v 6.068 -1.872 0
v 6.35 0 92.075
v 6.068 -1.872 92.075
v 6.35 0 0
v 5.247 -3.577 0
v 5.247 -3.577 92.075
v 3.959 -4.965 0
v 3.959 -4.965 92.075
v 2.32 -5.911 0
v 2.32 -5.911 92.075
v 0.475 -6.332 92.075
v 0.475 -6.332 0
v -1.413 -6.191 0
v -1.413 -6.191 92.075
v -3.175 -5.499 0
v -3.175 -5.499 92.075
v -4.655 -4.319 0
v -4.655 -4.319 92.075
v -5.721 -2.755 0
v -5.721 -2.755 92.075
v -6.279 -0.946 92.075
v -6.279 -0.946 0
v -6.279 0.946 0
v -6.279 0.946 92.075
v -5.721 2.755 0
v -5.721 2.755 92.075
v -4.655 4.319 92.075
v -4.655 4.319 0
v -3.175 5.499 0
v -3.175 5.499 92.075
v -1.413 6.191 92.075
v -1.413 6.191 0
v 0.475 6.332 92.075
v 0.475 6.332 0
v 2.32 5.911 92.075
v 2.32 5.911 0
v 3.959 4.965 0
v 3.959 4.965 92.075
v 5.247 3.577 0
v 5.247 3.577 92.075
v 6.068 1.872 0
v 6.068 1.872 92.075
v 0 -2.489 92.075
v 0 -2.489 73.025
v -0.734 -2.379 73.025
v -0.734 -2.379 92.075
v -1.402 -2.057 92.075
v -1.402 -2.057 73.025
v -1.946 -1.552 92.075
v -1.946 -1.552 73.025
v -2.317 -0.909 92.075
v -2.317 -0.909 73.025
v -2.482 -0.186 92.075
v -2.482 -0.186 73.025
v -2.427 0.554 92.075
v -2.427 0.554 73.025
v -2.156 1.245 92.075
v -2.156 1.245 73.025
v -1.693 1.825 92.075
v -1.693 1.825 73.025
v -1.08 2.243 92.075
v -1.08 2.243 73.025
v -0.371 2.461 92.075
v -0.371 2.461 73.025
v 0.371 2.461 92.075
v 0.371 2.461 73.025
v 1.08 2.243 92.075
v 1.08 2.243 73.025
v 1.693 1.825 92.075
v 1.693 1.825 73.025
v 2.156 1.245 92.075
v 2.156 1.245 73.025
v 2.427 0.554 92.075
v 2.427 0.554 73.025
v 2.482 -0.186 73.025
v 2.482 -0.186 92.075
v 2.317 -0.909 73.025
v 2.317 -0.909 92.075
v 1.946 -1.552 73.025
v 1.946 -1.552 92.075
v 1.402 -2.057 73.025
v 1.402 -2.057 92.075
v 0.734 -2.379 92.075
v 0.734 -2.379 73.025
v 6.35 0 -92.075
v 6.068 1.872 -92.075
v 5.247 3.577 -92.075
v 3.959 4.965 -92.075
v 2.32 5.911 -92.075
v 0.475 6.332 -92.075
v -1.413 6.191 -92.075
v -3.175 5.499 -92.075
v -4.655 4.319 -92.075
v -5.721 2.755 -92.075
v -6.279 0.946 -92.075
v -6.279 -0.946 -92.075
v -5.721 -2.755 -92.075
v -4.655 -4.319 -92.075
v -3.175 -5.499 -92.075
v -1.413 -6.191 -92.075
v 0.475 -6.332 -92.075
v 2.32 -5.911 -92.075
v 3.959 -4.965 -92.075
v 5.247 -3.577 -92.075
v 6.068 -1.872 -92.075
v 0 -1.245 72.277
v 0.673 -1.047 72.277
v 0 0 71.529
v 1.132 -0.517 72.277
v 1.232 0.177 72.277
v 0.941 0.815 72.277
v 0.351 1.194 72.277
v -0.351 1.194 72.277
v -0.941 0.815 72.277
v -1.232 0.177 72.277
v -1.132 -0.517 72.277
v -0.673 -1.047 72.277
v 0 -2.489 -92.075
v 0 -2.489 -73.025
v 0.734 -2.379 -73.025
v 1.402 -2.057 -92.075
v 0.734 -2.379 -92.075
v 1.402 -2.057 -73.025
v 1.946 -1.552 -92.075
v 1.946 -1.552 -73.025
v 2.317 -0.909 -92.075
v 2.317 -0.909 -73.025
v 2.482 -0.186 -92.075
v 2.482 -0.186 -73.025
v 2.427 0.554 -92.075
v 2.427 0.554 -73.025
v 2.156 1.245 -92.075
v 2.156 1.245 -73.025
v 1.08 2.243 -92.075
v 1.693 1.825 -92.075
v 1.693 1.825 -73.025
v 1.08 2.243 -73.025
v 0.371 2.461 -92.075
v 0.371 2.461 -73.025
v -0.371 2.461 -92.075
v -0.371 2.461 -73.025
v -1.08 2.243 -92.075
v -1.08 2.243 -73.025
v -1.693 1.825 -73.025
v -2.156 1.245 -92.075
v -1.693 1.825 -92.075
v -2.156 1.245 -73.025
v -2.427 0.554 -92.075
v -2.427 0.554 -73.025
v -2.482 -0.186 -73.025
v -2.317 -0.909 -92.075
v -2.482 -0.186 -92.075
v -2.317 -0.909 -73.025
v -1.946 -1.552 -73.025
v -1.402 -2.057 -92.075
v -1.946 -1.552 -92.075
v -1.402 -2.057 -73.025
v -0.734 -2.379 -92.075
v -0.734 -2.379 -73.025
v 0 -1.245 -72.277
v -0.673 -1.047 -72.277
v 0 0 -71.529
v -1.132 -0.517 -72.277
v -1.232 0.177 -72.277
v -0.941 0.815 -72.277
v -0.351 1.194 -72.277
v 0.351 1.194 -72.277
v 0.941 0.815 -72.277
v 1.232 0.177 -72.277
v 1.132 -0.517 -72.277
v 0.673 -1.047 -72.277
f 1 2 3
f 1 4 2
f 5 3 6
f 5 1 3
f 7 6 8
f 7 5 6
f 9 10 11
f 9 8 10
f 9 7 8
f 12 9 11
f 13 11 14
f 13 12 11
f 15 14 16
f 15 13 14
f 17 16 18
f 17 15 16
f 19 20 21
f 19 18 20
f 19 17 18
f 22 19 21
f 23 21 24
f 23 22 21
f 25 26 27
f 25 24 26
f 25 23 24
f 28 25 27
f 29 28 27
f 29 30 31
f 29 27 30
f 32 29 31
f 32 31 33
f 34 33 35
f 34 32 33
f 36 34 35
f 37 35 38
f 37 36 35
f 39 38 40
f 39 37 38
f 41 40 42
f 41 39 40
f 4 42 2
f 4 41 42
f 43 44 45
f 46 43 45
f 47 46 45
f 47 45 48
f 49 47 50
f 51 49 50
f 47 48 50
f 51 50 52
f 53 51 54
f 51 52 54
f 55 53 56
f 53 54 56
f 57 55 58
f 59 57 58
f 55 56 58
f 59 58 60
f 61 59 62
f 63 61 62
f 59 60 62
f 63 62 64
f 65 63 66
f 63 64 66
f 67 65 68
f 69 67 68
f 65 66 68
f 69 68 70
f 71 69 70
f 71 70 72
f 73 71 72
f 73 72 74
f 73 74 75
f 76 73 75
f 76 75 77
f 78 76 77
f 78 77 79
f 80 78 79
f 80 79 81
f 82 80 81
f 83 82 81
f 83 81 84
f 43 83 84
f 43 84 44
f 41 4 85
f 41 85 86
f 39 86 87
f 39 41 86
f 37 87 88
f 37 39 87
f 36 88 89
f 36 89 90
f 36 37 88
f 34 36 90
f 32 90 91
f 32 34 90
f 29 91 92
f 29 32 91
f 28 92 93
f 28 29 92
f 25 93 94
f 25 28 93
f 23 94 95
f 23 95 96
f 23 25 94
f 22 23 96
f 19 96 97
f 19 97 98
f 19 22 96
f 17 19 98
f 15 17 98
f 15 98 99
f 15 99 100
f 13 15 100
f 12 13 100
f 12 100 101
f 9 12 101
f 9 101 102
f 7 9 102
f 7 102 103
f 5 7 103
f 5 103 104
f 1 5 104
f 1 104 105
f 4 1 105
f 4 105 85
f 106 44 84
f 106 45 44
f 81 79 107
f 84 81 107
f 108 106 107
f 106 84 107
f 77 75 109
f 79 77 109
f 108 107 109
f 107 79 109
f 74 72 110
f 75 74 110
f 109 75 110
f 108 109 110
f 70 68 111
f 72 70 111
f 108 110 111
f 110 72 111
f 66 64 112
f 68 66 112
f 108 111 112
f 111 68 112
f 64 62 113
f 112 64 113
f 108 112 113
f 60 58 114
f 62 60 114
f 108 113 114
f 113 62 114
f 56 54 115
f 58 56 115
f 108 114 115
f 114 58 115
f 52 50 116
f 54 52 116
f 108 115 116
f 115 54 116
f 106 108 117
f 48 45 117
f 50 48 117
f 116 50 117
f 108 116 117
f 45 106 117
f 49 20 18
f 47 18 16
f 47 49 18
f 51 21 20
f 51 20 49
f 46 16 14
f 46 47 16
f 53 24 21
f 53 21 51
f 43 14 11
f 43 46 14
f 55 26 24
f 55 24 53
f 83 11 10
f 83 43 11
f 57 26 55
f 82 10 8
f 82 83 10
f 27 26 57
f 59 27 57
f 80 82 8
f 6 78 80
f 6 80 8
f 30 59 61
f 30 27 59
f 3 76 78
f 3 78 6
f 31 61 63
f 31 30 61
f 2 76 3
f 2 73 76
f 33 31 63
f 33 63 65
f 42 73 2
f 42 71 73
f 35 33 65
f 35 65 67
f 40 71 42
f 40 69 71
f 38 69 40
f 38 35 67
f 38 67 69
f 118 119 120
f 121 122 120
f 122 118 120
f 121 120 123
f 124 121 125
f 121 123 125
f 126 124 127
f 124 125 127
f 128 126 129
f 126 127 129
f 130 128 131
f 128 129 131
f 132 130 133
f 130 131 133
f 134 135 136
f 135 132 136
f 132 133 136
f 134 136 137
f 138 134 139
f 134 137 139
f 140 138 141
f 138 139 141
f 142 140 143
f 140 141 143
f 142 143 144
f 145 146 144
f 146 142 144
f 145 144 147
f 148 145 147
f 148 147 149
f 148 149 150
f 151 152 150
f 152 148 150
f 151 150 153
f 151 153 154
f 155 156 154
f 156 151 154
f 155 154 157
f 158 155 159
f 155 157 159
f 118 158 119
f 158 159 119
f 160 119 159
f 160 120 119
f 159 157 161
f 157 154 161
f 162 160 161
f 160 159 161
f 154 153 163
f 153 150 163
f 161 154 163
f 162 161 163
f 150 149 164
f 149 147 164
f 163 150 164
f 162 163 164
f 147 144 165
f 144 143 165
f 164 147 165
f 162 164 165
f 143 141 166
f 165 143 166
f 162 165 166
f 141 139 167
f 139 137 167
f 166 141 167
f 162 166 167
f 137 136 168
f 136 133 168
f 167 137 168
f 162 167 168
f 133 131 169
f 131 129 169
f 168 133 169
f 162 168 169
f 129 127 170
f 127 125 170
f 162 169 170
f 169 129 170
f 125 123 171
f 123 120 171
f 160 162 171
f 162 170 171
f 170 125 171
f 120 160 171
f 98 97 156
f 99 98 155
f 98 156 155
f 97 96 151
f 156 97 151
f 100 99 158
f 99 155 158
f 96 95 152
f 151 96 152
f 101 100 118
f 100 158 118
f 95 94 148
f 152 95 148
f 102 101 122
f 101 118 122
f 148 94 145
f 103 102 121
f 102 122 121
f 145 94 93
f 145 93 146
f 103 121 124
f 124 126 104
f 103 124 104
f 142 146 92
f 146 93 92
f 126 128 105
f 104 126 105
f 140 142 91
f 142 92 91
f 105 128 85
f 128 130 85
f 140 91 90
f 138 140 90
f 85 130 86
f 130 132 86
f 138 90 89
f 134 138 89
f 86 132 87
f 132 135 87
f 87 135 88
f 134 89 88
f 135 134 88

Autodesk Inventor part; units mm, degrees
ref_plane "YZ Plane" through (0, 0, 0) normal (1, 0, 0) x (0, 1, 0)
ref_plane "XZ Plane" through (0, 0, 0) normal (0, 1, 0) x (-1, 0, 0)
ref_plane "XY Plane" through (0, 0, 0) normal (0, 0, 1) x (1, 0, 0)
sketch "Sketch1" plane through (0, 0, 0) normal (0, 0, 1) x (1, 0, 0)
  circle A0 centre (0, 0) radius 6.35
  dimension "d0" = 12.7
extrude "Extrusion1" add sketch "Sketch1" along normal mid plane 184.15
sketch "Sketch2" plane through (0, 0, 92.075) normal (0, 0, 1) x (1, 0, 0)
  circle A0 centre (0, 0) radius 6.35 projected
hole "Hole1" at (0, 0, 92.075) direction (0, 0, -1) diameter 4.9784 depth 19.05 tip angle 118 thread size "1/4-20 UNC" class "2B" standard "ANSI Unified Screw Threads"
mirror "Mirror1" about plane through (0, 0, 0) normal (0, 0, 1) of "Hole1"
properties part number "wheel_shaft" material "Steel"
